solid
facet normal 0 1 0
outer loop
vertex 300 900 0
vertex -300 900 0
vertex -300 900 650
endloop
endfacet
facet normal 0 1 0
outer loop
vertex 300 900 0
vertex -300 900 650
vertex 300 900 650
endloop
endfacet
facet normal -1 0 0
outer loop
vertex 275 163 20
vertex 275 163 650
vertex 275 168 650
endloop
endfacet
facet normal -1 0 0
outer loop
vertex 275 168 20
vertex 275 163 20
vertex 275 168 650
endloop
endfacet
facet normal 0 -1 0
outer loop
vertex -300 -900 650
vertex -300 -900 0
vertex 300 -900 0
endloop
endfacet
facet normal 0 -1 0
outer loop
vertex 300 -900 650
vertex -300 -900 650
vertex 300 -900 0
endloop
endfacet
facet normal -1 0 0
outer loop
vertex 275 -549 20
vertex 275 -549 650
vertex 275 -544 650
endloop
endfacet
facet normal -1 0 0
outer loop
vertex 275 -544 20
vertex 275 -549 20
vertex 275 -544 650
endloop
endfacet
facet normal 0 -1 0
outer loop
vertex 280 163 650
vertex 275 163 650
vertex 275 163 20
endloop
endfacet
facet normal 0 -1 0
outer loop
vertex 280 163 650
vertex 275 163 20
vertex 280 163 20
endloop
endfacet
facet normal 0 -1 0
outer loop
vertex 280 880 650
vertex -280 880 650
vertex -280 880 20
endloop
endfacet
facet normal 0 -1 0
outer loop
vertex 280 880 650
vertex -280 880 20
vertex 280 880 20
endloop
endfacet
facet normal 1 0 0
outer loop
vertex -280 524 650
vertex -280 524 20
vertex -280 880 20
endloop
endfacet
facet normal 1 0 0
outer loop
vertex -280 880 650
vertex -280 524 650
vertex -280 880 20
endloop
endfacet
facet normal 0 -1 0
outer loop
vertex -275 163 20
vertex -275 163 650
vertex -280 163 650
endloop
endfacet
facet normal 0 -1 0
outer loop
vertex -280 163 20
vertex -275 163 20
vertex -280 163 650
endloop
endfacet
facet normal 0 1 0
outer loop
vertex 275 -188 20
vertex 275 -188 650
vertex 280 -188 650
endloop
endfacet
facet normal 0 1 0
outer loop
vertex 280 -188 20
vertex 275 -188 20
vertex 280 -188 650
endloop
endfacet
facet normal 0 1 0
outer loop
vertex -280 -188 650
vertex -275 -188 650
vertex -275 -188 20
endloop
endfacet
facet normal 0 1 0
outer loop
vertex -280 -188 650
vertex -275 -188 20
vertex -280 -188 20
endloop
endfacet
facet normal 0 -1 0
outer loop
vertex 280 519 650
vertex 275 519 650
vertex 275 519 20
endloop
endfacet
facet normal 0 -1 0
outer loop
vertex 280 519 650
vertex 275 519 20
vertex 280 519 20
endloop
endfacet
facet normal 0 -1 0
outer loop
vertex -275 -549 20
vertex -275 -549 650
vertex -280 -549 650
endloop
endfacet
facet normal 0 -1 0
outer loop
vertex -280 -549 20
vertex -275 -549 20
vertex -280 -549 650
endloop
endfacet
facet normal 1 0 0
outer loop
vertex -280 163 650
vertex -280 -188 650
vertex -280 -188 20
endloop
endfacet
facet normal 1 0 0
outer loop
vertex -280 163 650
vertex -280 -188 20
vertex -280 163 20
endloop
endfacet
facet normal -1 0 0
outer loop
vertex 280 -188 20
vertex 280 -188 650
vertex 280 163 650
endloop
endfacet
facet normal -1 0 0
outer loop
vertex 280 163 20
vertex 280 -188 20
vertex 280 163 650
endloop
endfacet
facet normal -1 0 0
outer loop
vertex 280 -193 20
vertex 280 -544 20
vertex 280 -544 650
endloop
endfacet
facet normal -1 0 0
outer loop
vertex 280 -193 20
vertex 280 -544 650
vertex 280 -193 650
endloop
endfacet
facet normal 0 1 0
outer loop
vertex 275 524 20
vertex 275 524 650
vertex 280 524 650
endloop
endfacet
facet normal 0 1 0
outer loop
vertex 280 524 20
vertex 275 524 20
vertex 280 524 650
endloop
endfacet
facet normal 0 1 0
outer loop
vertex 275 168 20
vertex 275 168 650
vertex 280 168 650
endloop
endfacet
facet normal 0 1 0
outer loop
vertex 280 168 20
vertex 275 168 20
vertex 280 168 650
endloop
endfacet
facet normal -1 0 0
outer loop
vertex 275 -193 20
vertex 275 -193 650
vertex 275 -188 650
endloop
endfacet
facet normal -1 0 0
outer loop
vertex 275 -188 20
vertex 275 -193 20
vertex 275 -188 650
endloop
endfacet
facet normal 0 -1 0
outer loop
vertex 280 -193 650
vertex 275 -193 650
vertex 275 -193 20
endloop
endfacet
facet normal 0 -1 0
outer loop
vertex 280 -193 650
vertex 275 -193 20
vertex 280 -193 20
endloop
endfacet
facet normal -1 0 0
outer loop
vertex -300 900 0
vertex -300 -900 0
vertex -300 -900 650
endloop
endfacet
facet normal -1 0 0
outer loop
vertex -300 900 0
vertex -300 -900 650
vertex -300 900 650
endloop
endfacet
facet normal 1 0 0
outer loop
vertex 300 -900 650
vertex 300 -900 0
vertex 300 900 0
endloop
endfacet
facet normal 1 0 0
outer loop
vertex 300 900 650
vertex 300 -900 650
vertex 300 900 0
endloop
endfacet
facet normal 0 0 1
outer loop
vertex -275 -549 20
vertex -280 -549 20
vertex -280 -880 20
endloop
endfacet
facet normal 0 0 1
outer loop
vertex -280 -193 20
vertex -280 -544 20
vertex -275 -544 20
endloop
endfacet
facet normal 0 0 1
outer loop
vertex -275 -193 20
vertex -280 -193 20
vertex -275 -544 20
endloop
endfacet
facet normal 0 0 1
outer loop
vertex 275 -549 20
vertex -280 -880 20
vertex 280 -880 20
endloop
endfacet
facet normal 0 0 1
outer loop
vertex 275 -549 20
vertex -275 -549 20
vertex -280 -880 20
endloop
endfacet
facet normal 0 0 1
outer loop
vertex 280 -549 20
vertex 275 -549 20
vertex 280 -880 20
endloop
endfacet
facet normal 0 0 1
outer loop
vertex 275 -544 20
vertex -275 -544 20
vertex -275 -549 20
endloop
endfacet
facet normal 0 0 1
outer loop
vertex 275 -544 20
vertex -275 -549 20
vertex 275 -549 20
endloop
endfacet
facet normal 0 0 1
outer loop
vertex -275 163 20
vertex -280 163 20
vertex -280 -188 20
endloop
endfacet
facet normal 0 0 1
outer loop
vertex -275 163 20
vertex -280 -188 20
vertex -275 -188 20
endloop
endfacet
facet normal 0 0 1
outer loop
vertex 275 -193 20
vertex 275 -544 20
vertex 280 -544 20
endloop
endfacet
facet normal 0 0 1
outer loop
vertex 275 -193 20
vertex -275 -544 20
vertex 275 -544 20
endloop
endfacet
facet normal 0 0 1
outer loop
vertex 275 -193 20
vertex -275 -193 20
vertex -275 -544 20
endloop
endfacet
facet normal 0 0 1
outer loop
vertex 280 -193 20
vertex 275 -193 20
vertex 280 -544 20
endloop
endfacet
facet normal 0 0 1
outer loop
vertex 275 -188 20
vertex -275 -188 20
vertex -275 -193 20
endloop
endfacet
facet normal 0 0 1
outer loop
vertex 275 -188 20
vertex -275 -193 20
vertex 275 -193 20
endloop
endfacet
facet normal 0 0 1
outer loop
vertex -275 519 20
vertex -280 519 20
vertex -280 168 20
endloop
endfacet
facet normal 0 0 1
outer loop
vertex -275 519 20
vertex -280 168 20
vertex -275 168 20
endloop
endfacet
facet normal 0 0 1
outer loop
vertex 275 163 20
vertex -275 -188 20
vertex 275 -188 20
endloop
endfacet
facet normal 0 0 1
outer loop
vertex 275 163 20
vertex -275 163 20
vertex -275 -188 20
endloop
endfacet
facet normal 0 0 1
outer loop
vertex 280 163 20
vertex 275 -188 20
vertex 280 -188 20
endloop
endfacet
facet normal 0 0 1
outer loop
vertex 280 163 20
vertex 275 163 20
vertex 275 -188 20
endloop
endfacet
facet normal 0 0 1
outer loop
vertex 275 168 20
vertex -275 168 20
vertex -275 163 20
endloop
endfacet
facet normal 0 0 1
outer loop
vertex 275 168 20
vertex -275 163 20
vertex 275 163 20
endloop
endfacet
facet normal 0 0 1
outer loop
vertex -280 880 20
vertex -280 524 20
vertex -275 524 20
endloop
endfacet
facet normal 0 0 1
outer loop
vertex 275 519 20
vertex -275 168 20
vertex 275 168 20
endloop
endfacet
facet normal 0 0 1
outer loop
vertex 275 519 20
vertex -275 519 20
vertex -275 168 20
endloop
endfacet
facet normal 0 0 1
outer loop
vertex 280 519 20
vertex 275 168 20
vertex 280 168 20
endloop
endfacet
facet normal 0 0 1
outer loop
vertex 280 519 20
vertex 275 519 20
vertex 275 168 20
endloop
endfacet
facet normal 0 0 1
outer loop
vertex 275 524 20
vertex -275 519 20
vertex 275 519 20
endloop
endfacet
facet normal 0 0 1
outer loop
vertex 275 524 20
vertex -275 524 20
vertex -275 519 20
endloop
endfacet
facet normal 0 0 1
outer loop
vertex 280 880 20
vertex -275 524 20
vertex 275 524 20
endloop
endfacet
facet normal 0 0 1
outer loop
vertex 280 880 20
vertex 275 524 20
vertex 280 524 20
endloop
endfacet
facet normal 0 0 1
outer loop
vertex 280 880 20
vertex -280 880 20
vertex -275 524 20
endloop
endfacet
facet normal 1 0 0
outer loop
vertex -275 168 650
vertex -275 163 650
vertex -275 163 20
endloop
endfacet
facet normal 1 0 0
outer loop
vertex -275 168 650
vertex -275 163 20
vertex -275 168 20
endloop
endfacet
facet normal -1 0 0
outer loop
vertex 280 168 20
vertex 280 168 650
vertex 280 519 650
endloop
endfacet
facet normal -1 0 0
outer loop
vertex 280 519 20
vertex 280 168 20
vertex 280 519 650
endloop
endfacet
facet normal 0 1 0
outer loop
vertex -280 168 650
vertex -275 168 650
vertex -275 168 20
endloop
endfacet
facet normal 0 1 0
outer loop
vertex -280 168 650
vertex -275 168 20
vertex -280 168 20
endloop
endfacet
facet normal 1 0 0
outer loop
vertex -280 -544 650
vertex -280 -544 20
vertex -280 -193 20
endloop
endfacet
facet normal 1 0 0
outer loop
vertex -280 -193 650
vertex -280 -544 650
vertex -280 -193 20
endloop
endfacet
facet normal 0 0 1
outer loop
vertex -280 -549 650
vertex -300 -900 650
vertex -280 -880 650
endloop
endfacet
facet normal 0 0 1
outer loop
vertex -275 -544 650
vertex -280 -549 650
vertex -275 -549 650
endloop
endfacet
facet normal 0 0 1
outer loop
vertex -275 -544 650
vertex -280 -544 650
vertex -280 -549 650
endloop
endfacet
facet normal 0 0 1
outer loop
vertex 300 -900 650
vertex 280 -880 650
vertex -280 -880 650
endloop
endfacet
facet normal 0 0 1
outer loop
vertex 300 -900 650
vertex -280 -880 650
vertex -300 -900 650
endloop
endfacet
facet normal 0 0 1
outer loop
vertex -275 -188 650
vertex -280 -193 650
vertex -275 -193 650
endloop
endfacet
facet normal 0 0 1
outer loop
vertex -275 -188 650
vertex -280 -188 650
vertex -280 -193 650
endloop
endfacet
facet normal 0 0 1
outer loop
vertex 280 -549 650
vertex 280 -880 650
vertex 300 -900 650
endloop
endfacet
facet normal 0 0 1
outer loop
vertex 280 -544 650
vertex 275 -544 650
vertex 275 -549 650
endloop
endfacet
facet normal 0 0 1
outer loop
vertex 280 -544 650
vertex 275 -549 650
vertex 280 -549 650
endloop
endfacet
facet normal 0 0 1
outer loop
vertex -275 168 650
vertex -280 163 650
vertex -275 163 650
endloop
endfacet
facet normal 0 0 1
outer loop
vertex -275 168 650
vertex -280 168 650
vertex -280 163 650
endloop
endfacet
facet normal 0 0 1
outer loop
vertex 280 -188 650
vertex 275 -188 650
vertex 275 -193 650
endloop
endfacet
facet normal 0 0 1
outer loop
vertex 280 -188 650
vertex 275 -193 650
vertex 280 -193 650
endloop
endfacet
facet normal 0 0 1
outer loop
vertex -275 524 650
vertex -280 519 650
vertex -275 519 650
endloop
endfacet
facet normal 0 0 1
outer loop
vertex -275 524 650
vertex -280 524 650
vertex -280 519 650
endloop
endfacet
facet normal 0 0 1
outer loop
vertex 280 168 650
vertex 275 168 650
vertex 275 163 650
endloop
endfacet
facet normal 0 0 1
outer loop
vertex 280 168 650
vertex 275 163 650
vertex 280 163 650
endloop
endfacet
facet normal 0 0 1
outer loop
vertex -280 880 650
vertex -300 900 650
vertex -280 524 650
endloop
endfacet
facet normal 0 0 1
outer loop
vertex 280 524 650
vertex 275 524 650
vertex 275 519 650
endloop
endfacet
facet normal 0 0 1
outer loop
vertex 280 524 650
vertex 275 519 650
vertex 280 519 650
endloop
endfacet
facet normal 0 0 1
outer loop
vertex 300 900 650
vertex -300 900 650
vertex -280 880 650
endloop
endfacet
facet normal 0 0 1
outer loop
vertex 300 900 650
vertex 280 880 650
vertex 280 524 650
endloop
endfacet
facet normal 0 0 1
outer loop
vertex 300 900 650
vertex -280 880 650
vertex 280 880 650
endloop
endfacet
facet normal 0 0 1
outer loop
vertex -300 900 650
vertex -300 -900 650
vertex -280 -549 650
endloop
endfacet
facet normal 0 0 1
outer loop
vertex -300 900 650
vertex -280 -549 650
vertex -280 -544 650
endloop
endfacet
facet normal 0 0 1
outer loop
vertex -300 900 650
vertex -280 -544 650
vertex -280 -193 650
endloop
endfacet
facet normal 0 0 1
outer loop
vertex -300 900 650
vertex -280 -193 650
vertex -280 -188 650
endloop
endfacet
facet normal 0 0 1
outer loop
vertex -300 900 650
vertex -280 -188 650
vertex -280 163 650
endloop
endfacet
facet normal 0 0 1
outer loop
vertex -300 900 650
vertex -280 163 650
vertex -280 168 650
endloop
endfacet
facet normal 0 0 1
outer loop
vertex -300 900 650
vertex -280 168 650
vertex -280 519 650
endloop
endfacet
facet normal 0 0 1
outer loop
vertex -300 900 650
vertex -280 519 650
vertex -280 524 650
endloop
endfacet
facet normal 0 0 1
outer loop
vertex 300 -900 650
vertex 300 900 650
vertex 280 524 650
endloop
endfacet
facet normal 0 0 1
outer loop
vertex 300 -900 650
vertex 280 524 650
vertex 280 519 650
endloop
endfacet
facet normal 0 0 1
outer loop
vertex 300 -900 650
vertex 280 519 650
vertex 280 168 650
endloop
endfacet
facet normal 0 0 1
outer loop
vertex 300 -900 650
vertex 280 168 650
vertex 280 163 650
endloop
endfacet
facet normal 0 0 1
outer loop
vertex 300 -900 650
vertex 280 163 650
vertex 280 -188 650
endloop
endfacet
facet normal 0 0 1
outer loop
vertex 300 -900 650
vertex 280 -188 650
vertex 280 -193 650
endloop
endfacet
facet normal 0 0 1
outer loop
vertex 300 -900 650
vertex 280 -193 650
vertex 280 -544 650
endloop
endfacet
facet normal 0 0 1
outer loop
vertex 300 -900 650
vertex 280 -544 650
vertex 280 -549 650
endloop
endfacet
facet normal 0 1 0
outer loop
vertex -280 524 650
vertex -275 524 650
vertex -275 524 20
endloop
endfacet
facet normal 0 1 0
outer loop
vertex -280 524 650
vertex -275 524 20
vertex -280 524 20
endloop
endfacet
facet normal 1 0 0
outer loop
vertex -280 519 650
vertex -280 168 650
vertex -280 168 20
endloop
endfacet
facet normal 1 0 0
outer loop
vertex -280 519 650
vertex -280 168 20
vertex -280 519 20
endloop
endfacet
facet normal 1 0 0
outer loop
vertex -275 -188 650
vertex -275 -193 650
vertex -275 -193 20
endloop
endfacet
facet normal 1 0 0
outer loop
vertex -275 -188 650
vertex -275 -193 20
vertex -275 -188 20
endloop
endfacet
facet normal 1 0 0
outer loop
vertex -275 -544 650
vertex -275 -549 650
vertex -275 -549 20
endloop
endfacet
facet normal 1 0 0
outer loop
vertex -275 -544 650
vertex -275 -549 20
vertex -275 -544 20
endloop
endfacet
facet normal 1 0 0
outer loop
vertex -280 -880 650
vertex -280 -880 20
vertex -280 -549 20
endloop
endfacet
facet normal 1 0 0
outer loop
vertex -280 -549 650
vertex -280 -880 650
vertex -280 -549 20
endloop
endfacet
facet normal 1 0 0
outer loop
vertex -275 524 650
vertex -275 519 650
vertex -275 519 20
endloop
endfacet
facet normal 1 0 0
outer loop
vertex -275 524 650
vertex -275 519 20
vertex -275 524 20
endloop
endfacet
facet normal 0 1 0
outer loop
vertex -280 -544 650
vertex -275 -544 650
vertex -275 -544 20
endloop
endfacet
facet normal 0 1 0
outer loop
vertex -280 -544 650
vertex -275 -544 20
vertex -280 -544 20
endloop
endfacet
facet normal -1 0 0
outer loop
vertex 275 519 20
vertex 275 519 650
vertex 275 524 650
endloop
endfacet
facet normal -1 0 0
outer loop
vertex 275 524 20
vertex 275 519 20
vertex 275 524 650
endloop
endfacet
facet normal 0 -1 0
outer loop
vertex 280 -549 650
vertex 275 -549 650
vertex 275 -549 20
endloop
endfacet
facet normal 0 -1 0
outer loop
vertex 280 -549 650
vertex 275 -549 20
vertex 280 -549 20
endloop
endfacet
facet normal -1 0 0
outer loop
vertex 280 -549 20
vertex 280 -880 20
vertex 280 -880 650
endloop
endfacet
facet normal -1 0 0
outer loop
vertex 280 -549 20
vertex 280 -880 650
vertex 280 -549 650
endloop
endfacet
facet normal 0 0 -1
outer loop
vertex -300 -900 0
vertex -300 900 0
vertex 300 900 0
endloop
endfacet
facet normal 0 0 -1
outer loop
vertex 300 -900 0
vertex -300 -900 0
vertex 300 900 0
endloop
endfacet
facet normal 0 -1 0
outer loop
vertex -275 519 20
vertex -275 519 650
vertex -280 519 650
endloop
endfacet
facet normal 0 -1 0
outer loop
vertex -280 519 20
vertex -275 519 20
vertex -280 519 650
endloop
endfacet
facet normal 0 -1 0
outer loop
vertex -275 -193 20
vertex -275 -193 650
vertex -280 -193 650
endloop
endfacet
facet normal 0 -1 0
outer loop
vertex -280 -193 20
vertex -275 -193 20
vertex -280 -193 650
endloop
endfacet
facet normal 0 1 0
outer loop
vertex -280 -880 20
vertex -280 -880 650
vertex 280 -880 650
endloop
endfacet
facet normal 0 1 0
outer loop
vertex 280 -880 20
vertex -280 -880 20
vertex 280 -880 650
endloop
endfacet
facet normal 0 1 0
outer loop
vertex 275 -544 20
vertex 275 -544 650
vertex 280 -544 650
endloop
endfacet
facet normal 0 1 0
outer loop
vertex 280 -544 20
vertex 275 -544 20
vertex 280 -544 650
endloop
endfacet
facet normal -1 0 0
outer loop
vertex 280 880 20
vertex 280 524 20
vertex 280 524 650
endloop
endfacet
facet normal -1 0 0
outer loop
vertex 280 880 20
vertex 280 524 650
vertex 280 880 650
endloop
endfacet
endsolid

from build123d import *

# Parameters (mm, degrees)
SKETCH1_W           = 600
SKETCH1_H           = 1800
BOSS_EXTRUDE1_DEPTH = 650
SHELL1_T            = -20
BOSS_EXTRUDE2_REACH = 1152
SKETCH2_W           = 5
SKETCH2_H           = 5


with BuildPart() as part:
    # Sketch1 → Boss-Extrude1 (new body)
    with BuildSketch(Plane.XY):
        Rectangle(SKETCH1_W, SKETCH1_H)
    extrude(amount=BOSS_EXTRUDE1_DEPTH)

    # Shell1
    shell1_openings = [part.faces().sort_by_distance(p)[0] for p in [
        (0, 0, 650),
    ]]
    offset(amount=SHELL1_T, openings=shell1_openings, kind=Kind.INTERSECTION)

    # Sketch2 → Boss-Extrude2 (add, up to next)
    with BuildSketch(Plane.XY.offset(650), mode=Mode.PRIVATE) as boss_extrude2_sk1:
        with Locations((277.5, 521.5)):
            Rectangle(SKETCH2_W, SKETCH2_H)
    boss_extrude2_tool1 = extrude(boss_extrude2_sk1.sketch, amount=-BOSS_EXTRUDE2_REACH, mode=Mode.PRIVATE) - part.part
    # Sketch2 → Boss-Extrude2 (add, up to next)
    with BuildSketch(Plane.XY.offset(650), mode=Mode.PRIVATE) as boss_extrude2_sk2:
        with Locations((277.5, 165.5)):
            Rectangle(SKETCH2_W, SKETCH2_H)
    boss_extrude2_tool2 = extrude(boss_extrude2_sk2.sketch, amount=-BOSS_EXTRUDE2_REACH, mode=Mode.PRIVATE) - part.part
    # Sketch2 → Boss-Extrude2 (add, up to next)
    with BuildSketch(Plane.XY.offset(650), mode=Mode.PRIVATE) as boss_extrude2_sk3:
        with Locations((277.5, -190.5)):
            Rectangle(SKETCH2_W, SKETCH2_H)
    boss_extrude2_tool3 = extrude(boss_extrude2_sk3.sketch, amount=-BOSS_EXTRUDE2_REACH, mode=Mode.PRIVATE) - part.part
    # Sketch2 → Boss-Extrude2 (add, up to next)
    with BuildSketch(Plane.XY.offset(650), mode=Mode.PRIVATE) as boss_extrude2_sk4:
        with Locations((277.5, -546.5)):
            Rectangle(SKETCH2_W, SKETCH2_H)
    boss_extrude2_tool4 = extrude(boss_extrude2_sk4.sketch, amount=-BOSS_EXTRUDE2_REACH, mode=Mode.PRIVATE) - part.part
    boss_extrude2_1 = boss_extrude2_tool1.solids().sort_by_distance((277.5, 521.5, 650))[0]
    add(boss_extrude2_1)
    boss_extrude2_2 = boss_extrude2_tool2.solids().sort_by_distance((277.5, 165.5, 650))[0]
    add(boss_extrude2_2)
    boss_extrude2_3 = boss_extrude2_tool3.solids().sort_by_distance((277.5, -190.5, 650))[0]
    add(boss_extrude2_3)
    boss_extrude2_4 = boss_extrude2_tool4.solids().sort_by_distance((277.5, -546.5, 650))[0]
    add(boss_extrude2_4)
    boss_extrude2 = boss_extrude2_1 + boss_extrude2_2 + boss_extrude2_3 + boss_extrude2_4  # Boss-Extrude2 as one shape, for the pattern or mirror that repeats it

    # Mirror1: Boss-Extrude2 across plane
    add(boss_extrude2.mirror(Plane(origin=(0, 0, 0), x_dir=(0, 0, 1), z_dir=(1, 0, 0))))


solid = part.part
